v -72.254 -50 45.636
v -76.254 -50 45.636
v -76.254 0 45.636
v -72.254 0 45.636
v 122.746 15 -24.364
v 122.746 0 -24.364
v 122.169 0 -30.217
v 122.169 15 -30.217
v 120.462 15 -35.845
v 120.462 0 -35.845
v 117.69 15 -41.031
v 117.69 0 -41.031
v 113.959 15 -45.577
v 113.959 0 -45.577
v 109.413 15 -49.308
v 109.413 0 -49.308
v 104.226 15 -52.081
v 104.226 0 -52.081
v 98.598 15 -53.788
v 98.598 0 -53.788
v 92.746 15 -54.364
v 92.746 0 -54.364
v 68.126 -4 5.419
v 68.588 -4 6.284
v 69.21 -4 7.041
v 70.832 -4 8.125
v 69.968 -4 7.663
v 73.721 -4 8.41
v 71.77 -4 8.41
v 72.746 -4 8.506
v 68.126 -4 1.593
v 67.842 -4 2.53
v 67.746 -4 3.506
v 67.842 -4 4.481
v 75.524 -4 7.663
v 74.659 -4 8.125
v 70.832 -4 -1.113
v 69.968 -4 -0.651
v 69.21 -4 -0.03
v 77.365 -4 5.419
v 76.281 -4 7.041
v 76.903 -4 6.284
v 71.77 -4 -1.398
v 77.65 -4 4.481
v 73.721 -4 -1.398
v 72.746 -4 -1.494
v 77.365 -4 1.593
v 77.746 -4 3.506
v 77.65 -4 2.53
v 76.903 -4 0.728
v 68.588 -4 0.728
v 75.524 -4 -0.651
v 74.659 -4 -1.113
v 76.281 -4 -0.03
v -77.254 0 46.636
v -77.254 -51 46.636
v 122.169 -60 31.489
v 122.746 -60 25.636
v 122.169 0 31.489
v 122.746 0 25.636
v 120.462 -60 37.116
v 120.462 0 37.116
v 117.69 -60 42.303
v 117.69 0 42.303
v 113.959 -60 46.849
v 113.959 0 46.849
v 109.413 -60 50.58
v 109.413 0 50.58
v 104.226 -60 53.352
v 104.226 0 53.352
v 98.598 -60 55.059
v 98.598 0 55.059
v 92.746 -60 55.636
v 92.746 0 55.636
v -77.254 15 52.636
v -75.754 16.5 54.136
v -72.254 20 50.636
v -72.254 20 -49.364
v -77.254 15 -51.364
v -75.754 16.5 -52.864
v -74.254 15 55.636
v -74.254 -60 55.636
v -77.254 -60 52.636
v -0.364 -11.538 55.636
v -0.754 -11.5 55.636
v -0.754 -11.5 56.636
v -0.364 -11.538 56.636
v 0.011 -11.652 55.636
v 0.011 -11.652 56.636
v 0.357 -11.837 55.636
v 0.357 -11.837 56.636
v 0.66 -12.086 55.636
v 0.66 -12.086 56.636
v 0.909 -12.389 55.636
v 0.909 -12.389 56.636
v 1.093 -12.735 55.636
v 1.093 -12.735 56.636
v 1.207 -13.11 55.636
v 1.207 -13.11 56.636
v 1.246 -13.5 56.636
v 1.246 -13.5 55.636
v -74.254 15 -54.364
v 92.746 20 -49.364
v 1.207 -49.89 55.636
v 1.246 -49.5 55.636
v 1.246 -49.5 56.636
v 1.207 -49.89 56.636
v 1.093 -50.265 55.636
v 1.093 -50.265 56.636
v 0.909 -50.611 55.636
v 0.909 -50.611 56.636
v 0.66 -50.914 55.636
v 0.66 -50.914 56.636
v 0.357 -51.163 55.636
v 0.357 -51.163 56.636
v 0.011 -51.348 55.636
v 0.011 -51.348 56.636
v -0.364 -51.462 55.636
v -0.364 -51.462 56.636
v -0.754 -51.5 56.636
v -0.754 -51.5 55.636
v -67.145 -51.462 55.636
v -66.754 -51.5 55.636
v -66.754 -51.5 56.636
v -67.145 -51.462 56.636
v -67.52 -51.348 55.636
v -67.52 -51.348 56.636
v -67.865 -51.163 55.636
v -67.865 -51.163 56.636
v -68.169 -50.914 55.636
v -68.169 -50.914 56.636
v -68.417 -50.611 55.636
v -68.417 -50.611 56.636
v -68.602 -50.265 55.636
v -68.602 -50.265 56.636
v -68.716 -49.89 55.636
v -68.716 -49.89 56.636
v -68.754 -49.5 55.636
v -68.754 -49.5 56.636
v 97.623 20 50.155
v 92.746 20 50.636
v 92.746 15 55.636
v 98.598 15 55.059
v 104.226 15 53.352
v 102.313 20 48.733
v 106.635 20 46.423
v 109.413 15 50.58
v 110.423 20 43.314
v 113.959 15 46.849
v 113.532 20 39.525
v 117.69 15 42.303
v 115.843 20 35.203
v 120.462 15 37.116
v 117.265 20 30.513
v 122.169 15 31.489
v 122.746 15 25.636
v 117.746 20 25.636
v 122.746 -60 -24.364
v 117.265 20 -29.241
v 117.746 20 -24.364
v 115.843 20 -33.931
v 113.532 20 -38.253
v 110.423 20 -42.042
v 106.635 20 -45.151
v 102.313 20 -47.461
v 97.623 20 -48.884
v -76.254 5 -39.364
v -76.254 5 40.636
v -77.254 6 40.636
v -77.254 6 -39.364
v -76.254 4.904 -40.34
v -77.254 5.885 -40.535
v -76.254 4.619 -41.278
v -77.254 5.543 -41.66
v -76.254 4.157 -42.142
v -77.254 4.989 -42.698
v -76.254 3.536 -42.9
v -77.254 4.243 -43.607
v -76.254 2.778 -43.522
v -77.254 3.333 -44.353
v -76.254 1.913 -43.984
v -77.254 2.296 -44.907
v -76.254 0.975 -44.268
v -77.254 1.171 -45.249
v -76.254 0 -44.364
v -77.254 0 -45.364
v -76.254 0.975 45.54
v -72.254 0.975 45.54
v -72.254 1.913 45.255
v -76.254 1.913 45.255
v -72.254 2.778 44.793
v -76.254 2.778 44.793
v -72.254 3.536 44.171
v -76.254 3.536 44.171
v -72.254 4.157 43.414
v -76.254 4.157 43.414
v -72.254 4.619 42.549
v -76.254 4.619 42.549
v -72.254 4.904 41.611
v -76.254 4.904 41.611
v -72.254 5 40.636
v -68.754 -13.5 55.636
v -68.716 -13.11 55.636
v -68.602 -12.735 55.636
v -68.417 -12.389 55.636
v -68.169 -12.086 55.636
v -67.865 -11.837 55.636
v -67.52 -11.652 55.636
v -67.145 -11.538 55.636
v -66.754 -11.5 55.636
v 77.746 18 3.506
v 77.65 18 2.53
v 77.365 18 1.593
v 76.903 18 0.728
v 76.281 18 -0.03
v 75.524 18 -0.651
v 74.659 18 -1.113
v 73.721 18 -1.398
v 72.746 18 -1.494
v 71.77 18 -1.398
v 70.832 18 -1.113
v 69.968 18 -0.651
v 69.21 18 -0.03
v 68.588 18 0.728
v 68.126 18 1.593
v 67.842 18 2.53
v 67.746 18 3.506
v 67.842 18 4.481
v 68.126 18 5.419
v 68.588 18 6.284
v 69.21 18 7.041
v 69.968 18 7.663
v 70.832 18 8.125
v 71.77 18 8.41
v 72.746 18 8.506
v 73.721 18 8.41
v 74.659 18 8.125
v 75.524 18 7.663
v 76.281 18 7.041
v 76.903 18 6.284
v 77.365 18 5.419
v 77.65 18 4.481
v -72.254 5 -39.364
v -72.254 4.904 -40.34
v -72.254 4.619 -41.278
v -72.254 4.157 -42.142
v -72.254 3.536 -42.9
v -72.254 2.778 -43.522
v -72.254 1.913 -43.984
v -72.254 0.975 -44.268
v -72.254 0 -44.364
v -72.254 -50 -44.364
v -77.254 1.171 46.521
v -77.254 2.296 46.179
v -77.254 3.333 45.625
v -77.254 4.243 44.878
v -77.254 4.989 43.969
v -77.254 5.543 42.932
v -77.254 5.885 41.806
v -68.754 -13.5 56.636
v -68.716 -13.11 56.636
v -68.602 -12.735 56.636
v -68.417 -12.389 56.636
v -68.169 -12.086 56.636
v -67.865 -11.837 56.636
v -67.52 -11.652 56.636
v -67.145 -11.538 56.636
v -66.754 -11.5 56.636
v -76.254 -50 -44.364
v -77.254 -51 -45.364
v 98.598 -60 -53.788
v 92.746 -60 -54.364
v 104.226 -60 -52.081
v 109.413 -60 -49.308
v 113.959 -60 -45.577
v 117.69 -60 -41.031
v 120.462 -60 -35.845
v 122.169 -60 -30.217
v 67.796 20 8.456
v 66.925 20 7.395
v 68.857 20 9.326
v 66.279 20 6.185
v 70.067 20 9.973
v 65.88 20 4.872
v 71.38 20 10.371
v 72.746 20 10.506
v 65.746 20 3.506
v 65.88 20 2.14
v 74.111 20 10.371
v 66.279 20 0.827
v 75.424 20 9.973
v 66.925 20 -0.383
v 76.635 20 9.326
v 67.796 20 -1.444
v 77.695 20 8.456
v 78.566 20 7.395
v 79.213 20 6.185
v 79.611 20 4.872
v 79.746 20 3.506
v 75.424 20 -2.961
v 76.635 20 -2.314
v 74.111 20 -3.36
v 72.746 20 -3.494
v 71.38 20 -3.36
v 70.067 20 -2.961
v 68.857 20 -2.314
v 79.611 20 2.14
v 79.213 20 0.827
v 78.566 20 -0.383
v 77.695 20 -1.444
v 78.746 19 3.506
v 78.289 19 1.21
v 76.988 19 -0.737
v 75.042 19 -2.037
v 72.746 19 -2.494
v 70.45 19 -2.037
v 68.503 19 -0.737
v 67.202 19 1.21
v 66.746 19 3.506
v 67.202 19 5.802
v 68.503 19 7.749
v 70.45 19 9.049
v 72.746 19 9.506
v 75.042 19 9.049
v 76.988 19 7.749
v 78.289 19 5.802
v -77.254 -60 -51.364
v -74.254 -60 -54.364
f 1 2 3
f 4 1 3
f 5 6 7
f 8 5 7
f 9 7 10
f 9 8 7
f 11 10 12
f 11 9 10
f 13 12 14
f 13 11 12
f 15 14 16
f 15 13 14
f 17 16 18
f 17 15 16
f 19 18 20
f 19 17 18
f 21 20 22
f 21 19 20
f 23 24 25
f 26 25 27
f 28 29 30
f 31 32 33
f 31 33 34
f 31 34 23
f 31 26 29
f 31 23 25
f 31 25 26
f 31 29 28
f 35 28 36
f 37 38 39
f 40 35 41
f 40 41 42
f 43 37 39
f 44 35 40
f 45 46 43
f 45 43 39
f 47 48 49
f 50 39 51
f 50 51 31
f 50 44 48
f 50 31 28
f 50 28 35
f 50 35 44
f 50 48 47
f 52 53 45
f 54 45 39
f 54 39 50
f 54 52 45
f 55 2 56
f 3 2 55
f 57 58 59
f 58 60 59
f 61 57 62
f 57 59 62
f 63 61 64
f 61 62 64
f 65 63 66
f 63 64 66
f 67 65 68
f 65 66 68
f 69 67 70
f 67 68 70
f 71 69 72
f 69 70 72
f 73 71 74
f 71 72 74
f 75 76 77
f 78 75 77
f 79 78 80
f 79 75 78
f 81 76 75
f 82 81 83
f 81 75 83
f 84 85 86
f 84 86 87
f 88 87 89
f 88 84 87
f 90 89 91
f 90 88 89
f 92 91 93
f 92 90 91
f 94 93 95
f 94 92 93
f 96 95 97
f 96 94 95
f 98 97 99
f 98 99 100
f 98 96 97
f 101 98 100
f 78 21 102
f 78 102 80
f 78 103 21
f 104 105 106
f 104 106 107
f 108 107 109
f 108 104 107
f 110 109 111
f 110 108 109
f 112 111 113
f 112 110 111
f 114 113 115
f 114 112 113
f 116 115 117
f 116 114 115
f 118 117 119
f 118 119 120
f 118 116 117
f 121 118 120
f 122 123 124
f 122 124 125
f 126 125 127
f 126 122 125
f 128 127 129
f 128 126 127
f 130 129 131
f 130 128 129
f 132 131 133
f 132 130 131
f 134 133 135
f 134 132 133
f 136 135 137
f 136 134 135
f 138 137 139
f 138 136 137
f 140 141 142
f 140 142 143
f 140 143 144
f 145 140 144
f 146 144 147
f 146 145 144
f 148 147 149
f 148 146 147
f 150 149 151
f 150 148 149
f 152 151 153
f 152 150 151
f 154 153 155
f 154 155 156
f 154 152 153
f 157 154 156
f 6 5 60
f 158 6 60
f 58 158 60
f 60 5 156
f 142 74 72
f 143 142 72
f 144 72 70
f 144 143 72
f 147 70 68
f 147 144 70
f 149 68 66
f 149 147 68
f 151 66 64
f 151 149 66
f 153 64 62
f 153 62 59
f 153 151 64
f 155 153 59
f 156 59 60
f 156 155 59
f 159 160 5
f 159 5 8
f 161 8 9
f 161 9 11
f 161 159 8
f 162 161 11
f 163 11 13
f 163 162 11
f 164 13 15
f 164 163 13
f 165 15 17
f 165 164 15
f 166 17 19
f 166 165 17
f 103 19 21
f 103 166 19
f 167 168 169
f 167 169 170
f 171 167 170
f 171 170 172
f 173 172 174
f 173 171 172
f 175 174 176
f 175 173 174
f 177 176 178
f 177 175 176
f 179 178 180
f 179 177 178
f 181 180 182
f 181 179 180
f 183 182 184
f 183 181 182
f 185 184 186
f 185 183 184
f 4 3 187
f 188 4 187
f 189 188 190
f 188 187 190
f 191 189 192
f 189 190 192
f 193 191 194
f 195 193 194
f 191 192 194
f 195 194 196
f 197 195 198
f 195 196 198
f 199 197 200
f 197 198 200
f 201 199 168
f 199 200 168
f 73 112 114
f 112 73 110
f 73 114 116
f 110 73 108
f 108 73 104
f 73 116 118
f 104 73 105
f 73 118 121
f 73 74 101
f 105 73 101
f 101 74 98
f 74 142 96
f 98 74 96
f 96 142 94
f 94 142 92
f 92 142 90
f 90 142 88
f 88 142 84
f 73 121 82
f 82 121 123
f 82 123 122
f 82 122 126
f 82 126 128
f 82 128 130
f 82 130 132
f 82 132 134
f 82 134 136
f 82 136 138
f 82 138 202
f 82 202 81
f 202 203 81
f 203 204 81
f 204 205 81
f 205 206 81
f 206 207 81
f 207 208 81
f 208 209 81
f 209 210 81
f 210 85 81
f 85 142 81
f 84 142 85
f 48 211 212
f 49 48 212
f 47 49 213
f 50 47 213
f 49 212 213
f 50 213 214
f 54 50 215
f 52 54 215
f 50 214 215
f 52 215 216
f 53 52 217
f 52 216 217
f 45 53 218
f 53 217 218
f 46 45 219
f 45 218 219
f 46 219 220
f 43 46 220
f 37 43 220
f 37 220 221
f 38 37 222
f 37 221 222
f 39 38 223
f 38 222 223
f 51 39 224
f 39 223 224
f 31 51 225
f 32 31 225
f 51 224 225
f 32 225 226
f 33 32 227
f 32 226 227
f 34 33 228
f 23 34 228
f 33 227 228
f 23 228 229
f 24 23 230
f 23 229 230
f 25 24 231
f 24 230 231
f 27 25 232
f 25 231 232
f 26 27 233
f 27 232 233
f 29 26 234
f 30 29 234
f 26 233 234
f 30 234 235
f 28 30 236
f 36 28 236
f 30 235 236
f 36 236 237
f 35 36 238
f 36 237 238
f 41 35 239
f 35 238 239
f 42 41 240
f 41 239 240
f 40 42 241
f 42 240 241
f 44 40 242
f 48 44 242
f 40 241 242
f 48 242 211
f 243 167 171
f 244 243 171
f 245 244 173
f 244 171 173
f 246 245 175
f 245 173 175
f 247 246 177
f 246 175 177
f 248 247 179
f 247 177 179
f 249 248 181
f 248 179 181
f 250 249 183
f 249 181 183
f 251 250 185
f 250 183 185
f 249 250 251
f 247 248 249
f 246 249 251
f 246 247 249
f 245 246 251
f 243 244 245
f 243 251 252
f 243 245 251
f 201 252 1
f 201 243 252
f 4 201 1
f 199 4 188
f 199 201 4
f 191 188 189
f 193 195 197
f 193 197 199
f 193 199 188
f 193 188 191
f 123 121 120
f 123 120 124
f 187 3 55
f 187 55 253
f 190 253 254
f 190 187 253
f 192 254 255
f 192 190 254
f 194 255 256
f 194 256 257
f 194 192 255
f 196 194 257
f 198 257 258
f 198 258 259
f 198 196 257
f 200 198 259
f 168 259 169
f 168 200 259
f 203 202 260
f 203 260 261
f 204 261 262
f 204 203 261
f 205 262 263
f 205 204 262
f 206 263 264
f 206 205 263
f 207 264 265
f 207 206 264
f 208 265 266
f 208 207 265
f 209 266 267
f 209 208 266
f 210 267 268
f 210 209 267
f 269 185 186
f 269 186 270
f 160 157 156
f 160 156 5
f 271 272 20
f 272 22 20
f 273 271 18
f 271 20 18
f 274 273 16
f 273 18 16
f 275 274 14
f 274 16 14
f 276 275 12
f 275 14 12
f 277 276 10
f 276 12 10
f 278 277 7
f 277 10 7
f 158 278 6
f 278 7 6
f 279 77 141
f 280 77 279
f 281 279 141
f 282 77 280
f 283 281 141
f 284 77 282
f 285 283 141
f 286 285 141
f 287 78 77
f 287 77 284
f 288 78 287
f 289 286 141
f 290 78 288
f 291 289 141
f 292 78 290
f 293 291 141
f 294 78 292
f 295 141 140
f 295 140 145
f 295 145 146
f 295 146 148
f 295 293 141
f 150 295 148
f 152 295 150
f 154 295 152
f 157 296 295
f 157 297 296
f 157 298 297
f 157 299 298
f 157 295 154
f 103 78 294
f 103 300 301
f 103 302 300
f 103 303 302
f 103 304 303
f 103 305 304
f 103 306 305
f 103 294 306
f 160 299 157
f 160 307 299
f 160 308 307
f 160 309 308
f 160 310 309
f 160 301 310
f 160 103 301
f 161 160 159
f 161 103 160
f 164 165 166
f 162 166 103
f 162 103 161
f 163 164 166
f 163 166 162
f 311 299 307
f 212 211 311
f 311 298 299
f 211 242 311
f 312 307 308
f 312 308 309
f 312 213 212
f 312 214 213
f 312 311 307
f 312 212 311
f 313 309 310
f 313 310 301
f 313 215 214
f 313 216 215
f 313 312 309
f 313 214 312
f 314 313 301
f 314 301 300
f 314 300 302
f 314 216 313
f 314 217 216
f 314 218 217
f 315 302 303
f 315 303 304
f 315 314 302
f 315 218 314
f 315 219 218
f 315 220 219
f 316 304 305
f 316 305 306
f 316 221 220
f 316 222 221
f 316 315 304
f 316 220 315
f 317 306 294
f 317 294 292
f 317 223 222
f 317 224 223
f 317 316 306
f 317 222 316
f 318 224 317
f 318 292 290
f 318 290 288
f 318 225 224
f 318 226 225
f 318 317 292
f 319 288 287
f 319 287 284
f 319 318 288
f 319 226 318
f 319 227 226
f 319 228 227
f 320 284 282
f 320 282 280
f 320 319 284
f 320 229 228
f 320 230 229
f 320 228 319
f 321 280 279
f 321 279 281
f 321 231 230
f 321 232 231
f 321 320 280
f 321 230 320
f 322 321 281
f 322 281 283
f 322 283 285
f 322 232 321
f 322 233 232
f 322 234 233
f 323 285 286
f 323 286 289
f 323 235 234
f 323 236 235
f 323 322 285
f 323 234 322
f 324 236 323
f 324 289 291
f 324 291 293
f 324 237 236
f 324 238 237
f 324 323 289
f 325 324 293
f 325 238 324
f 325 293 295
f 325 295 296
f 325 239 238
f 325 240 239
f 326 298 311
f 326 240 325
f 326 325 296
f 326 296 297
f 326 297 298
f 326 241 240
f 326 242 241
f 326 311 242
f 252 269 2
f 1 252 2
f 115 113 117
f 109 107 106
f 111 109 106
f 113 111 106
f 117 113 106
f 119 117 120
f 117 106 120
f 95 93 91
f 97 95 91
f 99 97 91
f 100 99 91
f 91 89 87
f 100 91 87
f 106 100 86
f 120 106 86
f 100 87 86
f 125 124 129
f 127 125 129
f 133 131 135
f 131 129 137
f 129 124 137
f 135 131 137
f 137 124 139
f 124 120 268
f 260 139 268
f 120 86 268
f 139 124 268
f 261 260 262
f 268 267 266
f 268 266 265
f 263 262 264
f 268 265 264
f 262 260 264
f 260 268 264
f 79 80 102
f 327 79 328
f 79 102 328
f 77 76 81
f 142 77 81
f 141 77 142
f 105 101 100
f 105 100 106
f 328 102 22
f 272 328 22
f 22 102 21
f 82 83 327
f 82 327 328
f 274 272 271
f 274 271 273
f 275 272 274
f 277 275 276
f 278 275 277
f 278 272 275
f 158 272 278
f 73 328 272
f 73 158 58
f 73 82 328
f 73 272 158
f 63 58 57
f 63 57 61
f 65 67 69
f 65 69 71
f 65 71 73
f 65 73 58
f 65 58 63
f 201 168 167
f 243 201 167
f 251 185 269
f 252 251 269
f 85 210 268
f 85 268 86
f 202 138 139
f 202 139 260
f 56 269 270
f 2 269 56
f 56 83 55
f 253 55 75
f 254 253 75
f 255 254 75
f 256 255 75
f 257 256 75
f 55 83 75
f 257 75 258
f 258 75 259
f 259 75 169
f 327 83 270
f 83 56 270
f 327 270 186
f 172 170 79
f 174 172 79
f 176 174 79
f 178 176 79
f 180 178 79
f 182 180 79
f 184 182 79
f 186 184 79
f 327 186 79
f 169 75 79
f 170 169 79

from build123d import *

# Parameters (mm, degrees)
SKETCH1_W           = 200
SKETCH1_H           = 110
BOSS_EXTRUDE1_DEPTH = 20
FILLET2_R           = 30
SKETCH2_R           = 5
CUT_EXTRUDE1_DEPTH  = 24
CHAMFER1_SIZE       = 5
BOSS_EXTRUDE2_DEPTH = 1
CUT_EXTRUDE2_DEPTH  = 5
CHAMFER2_SIZE       = 1
CHAMFER3_SIZE       = 2
CHAMFER4_SIZE       = 3


with BuildPart() as part:
    # Sketch1 → Boss-Extrude1 (new body)
    with BuildSketch(Plane(origin=(0, 0, 0), x_dir=(1, 0, 0), z_dir=(0, 1, 0))):
        with Locations((22.74566474, -0.63583815)):
            Rectangle(SKETCH1_W, SKETCH1_H)
    extrude(amount=BOSS_EXTRUDE1_DEPTH)

    # Fillet2
    fillet2_edges = [part.edges().sort_by_distance(p)[0] for p in [
        (122.74566474, 10, -54.36416185),
        (122.74566474, 10, 55.63583815),
    ]]
    fillet(fillet2_edges, radius=FILLET2_R)

    # Sketch4 → section 0 of loft1
    with BuildSketch(Plane(origin=(0, -60, 0), x_dir=(-1, 0, 0), z_dir=(0, -1, 0)), mode=Mode.PRIVATE) as loft1_s0:
        with BuildLine():
            Line((-122.74566474, 24.36416185), (-122.74566474, -25.63583815))
            ThreePointArc((-122.74566474, -25.63583815), (-113.958868175, -46.849041586), (-92.74566474, -55.63583815))
            Line((-92.74566474, -55.63583815), (77.25433526, -55.63583815))
            Line((77.25433526, -55.63583815), (77.25433526, 54.36416185))
            Line((77.25433526, 54.36416185), (-92.74566474, 54.36416185))
            ThreePointArc((-92.74566474, 54.36416185), (-113.958868175, 45.577365285), (-122.74566474, 24.36416185))
        make_face()
    # loft up to a face of the part (loft1)
    loft([loft1_s0.sketch, part.faces().sort_by_distance((21.078212912, 0, 0.63583815))[0]])

    # Sketch2 → Cut-Extrude1 (cut)
    with BuildSketch(Plane(origin=(0, 20, 0), x_dir=(1, 0, 0), z_dir=(0, 1, 0))):
        with Locations((72.74566474, -3.505923633)):
            Circle(SKETCH2_R)
    extrude(amount=-CUT_EXTRUDE1_DEPTH, mode=Mode.SUBTRACT)

    # Chamfer1
    chamfer1_edges = [part.edges().sort_by_distance(p)[0] for p in [
        (113.958868175, 20, 46.849041586),
        (7.74566474, 20, 55.63583815),
        (-77.25433526, 20, 0.63583815),
        (7.74566474, 20, -54.36416185),
        (113.958868175, 20, -45.577365285),
        (122.74566474, 20, 0.63583815),
    ]]
    chamfer(chamfer1_edges, length=CHAMFER1_SIZE)

    # Sketch5 → Boss-Extrude2 (add)
    with BuildSketch(Plane.XY.offset(55.63583815)):
        with BuildLine():
            ThreePointArc((-68.75433526, -13.5), (-68.168548822, -12.085786438), (-66.75433526, -11.5))
            Line((-66.75433526, -11.5), (-0.75433526, -11.5))
            ThreePointArc((-0.75433526, -11.5), (0.659878302, -12.085786438), (1.24566474, -13.5))
            Line((1.24566474, -13.5), (1.24566474, -49.5))
            ThreePointArc((1.24566474, -49.5), (0.659878302, -50.914213562), (-0.75433526, -51.5))
            Line((-0.75433526, -51.5), (-66.75433526, -51.5))
            ThreePointArc((-66.75433526, -51.5), (-68.168548822, -50.914213562), (-68.75433526, -49.5))
            Line((-68.75433526, -49.5), (-68.75433526, -13.5))
        make_face()
    extrude(amount=BOSS_EXTRUDE2_DEPTH)

    # Sketch6 → Cut-Extrude2 (cut)
    with BuildSketch(Plane.ZY.offset(77.25433526)):
        with BuildLine():
            Line((40.63583815, 5), (-39.36416185, 5))
            ThreePointArc((-39.36416185, 5), (-42.899695756, 3.535533906), (-44.36416185, 0))
            Line((-44.36416185, 0), (-44.36416185, -50))
            Line((-44.36416185, -50), (45.63583815, -50))
            Line((45.63583815, -50), (45.63583815, 0))
            ThreePointArc((45.63583815, 0), (44.171372056, 3.535533906), (40.63583815, 5))
        make_face()
    extrude(amount=-CUT_EXTRUDE2_DEPTH, mode=Mode.SUBTRACT)

    # Chamfer2
    chamfer2_edges = [part.edges().sort_by_distance(p)[0] for p in [
        (-77.25433526, 3.535533906, 44.171372056),
        (-77.25433526, 5, 0.63583815),
        (-77.25433526, 3.535533906, -42.899695756),
        (-77.25433526, -25, -44.36416185),
        (-77.25433526, -50, 0.63583815),
        (-77.25433526, -25, 45.63583815),
    ]]
    chamfer(chamfer2_edges, length=CHAMFER2_SIZE)

    # Chamfer3
    chamfer3_edges = [part.edges().sort_by_distance(p)[0] for p in [
        (67.74566474, 20, 3.505923633),
    ]]
    chamfer(chamfer3_edges, length=CHAMFER3_SIZE)

    # Chamfer4
    chamfer4_edges = [part.edges().sort_by_distance(p)[0] for p in [
        (-77.25433526, -22.5, 55.63583815),
        (-77.25433526, -22.5, 55.63583815),
        (-77.25433526, -22.5, -54.36416185),
        (-77.25433526, -22.5, -54.36416185),
    ]]
    chamfer(chamfer4_edges, length=CHAMFER4_SIZE)


solid = part.part
